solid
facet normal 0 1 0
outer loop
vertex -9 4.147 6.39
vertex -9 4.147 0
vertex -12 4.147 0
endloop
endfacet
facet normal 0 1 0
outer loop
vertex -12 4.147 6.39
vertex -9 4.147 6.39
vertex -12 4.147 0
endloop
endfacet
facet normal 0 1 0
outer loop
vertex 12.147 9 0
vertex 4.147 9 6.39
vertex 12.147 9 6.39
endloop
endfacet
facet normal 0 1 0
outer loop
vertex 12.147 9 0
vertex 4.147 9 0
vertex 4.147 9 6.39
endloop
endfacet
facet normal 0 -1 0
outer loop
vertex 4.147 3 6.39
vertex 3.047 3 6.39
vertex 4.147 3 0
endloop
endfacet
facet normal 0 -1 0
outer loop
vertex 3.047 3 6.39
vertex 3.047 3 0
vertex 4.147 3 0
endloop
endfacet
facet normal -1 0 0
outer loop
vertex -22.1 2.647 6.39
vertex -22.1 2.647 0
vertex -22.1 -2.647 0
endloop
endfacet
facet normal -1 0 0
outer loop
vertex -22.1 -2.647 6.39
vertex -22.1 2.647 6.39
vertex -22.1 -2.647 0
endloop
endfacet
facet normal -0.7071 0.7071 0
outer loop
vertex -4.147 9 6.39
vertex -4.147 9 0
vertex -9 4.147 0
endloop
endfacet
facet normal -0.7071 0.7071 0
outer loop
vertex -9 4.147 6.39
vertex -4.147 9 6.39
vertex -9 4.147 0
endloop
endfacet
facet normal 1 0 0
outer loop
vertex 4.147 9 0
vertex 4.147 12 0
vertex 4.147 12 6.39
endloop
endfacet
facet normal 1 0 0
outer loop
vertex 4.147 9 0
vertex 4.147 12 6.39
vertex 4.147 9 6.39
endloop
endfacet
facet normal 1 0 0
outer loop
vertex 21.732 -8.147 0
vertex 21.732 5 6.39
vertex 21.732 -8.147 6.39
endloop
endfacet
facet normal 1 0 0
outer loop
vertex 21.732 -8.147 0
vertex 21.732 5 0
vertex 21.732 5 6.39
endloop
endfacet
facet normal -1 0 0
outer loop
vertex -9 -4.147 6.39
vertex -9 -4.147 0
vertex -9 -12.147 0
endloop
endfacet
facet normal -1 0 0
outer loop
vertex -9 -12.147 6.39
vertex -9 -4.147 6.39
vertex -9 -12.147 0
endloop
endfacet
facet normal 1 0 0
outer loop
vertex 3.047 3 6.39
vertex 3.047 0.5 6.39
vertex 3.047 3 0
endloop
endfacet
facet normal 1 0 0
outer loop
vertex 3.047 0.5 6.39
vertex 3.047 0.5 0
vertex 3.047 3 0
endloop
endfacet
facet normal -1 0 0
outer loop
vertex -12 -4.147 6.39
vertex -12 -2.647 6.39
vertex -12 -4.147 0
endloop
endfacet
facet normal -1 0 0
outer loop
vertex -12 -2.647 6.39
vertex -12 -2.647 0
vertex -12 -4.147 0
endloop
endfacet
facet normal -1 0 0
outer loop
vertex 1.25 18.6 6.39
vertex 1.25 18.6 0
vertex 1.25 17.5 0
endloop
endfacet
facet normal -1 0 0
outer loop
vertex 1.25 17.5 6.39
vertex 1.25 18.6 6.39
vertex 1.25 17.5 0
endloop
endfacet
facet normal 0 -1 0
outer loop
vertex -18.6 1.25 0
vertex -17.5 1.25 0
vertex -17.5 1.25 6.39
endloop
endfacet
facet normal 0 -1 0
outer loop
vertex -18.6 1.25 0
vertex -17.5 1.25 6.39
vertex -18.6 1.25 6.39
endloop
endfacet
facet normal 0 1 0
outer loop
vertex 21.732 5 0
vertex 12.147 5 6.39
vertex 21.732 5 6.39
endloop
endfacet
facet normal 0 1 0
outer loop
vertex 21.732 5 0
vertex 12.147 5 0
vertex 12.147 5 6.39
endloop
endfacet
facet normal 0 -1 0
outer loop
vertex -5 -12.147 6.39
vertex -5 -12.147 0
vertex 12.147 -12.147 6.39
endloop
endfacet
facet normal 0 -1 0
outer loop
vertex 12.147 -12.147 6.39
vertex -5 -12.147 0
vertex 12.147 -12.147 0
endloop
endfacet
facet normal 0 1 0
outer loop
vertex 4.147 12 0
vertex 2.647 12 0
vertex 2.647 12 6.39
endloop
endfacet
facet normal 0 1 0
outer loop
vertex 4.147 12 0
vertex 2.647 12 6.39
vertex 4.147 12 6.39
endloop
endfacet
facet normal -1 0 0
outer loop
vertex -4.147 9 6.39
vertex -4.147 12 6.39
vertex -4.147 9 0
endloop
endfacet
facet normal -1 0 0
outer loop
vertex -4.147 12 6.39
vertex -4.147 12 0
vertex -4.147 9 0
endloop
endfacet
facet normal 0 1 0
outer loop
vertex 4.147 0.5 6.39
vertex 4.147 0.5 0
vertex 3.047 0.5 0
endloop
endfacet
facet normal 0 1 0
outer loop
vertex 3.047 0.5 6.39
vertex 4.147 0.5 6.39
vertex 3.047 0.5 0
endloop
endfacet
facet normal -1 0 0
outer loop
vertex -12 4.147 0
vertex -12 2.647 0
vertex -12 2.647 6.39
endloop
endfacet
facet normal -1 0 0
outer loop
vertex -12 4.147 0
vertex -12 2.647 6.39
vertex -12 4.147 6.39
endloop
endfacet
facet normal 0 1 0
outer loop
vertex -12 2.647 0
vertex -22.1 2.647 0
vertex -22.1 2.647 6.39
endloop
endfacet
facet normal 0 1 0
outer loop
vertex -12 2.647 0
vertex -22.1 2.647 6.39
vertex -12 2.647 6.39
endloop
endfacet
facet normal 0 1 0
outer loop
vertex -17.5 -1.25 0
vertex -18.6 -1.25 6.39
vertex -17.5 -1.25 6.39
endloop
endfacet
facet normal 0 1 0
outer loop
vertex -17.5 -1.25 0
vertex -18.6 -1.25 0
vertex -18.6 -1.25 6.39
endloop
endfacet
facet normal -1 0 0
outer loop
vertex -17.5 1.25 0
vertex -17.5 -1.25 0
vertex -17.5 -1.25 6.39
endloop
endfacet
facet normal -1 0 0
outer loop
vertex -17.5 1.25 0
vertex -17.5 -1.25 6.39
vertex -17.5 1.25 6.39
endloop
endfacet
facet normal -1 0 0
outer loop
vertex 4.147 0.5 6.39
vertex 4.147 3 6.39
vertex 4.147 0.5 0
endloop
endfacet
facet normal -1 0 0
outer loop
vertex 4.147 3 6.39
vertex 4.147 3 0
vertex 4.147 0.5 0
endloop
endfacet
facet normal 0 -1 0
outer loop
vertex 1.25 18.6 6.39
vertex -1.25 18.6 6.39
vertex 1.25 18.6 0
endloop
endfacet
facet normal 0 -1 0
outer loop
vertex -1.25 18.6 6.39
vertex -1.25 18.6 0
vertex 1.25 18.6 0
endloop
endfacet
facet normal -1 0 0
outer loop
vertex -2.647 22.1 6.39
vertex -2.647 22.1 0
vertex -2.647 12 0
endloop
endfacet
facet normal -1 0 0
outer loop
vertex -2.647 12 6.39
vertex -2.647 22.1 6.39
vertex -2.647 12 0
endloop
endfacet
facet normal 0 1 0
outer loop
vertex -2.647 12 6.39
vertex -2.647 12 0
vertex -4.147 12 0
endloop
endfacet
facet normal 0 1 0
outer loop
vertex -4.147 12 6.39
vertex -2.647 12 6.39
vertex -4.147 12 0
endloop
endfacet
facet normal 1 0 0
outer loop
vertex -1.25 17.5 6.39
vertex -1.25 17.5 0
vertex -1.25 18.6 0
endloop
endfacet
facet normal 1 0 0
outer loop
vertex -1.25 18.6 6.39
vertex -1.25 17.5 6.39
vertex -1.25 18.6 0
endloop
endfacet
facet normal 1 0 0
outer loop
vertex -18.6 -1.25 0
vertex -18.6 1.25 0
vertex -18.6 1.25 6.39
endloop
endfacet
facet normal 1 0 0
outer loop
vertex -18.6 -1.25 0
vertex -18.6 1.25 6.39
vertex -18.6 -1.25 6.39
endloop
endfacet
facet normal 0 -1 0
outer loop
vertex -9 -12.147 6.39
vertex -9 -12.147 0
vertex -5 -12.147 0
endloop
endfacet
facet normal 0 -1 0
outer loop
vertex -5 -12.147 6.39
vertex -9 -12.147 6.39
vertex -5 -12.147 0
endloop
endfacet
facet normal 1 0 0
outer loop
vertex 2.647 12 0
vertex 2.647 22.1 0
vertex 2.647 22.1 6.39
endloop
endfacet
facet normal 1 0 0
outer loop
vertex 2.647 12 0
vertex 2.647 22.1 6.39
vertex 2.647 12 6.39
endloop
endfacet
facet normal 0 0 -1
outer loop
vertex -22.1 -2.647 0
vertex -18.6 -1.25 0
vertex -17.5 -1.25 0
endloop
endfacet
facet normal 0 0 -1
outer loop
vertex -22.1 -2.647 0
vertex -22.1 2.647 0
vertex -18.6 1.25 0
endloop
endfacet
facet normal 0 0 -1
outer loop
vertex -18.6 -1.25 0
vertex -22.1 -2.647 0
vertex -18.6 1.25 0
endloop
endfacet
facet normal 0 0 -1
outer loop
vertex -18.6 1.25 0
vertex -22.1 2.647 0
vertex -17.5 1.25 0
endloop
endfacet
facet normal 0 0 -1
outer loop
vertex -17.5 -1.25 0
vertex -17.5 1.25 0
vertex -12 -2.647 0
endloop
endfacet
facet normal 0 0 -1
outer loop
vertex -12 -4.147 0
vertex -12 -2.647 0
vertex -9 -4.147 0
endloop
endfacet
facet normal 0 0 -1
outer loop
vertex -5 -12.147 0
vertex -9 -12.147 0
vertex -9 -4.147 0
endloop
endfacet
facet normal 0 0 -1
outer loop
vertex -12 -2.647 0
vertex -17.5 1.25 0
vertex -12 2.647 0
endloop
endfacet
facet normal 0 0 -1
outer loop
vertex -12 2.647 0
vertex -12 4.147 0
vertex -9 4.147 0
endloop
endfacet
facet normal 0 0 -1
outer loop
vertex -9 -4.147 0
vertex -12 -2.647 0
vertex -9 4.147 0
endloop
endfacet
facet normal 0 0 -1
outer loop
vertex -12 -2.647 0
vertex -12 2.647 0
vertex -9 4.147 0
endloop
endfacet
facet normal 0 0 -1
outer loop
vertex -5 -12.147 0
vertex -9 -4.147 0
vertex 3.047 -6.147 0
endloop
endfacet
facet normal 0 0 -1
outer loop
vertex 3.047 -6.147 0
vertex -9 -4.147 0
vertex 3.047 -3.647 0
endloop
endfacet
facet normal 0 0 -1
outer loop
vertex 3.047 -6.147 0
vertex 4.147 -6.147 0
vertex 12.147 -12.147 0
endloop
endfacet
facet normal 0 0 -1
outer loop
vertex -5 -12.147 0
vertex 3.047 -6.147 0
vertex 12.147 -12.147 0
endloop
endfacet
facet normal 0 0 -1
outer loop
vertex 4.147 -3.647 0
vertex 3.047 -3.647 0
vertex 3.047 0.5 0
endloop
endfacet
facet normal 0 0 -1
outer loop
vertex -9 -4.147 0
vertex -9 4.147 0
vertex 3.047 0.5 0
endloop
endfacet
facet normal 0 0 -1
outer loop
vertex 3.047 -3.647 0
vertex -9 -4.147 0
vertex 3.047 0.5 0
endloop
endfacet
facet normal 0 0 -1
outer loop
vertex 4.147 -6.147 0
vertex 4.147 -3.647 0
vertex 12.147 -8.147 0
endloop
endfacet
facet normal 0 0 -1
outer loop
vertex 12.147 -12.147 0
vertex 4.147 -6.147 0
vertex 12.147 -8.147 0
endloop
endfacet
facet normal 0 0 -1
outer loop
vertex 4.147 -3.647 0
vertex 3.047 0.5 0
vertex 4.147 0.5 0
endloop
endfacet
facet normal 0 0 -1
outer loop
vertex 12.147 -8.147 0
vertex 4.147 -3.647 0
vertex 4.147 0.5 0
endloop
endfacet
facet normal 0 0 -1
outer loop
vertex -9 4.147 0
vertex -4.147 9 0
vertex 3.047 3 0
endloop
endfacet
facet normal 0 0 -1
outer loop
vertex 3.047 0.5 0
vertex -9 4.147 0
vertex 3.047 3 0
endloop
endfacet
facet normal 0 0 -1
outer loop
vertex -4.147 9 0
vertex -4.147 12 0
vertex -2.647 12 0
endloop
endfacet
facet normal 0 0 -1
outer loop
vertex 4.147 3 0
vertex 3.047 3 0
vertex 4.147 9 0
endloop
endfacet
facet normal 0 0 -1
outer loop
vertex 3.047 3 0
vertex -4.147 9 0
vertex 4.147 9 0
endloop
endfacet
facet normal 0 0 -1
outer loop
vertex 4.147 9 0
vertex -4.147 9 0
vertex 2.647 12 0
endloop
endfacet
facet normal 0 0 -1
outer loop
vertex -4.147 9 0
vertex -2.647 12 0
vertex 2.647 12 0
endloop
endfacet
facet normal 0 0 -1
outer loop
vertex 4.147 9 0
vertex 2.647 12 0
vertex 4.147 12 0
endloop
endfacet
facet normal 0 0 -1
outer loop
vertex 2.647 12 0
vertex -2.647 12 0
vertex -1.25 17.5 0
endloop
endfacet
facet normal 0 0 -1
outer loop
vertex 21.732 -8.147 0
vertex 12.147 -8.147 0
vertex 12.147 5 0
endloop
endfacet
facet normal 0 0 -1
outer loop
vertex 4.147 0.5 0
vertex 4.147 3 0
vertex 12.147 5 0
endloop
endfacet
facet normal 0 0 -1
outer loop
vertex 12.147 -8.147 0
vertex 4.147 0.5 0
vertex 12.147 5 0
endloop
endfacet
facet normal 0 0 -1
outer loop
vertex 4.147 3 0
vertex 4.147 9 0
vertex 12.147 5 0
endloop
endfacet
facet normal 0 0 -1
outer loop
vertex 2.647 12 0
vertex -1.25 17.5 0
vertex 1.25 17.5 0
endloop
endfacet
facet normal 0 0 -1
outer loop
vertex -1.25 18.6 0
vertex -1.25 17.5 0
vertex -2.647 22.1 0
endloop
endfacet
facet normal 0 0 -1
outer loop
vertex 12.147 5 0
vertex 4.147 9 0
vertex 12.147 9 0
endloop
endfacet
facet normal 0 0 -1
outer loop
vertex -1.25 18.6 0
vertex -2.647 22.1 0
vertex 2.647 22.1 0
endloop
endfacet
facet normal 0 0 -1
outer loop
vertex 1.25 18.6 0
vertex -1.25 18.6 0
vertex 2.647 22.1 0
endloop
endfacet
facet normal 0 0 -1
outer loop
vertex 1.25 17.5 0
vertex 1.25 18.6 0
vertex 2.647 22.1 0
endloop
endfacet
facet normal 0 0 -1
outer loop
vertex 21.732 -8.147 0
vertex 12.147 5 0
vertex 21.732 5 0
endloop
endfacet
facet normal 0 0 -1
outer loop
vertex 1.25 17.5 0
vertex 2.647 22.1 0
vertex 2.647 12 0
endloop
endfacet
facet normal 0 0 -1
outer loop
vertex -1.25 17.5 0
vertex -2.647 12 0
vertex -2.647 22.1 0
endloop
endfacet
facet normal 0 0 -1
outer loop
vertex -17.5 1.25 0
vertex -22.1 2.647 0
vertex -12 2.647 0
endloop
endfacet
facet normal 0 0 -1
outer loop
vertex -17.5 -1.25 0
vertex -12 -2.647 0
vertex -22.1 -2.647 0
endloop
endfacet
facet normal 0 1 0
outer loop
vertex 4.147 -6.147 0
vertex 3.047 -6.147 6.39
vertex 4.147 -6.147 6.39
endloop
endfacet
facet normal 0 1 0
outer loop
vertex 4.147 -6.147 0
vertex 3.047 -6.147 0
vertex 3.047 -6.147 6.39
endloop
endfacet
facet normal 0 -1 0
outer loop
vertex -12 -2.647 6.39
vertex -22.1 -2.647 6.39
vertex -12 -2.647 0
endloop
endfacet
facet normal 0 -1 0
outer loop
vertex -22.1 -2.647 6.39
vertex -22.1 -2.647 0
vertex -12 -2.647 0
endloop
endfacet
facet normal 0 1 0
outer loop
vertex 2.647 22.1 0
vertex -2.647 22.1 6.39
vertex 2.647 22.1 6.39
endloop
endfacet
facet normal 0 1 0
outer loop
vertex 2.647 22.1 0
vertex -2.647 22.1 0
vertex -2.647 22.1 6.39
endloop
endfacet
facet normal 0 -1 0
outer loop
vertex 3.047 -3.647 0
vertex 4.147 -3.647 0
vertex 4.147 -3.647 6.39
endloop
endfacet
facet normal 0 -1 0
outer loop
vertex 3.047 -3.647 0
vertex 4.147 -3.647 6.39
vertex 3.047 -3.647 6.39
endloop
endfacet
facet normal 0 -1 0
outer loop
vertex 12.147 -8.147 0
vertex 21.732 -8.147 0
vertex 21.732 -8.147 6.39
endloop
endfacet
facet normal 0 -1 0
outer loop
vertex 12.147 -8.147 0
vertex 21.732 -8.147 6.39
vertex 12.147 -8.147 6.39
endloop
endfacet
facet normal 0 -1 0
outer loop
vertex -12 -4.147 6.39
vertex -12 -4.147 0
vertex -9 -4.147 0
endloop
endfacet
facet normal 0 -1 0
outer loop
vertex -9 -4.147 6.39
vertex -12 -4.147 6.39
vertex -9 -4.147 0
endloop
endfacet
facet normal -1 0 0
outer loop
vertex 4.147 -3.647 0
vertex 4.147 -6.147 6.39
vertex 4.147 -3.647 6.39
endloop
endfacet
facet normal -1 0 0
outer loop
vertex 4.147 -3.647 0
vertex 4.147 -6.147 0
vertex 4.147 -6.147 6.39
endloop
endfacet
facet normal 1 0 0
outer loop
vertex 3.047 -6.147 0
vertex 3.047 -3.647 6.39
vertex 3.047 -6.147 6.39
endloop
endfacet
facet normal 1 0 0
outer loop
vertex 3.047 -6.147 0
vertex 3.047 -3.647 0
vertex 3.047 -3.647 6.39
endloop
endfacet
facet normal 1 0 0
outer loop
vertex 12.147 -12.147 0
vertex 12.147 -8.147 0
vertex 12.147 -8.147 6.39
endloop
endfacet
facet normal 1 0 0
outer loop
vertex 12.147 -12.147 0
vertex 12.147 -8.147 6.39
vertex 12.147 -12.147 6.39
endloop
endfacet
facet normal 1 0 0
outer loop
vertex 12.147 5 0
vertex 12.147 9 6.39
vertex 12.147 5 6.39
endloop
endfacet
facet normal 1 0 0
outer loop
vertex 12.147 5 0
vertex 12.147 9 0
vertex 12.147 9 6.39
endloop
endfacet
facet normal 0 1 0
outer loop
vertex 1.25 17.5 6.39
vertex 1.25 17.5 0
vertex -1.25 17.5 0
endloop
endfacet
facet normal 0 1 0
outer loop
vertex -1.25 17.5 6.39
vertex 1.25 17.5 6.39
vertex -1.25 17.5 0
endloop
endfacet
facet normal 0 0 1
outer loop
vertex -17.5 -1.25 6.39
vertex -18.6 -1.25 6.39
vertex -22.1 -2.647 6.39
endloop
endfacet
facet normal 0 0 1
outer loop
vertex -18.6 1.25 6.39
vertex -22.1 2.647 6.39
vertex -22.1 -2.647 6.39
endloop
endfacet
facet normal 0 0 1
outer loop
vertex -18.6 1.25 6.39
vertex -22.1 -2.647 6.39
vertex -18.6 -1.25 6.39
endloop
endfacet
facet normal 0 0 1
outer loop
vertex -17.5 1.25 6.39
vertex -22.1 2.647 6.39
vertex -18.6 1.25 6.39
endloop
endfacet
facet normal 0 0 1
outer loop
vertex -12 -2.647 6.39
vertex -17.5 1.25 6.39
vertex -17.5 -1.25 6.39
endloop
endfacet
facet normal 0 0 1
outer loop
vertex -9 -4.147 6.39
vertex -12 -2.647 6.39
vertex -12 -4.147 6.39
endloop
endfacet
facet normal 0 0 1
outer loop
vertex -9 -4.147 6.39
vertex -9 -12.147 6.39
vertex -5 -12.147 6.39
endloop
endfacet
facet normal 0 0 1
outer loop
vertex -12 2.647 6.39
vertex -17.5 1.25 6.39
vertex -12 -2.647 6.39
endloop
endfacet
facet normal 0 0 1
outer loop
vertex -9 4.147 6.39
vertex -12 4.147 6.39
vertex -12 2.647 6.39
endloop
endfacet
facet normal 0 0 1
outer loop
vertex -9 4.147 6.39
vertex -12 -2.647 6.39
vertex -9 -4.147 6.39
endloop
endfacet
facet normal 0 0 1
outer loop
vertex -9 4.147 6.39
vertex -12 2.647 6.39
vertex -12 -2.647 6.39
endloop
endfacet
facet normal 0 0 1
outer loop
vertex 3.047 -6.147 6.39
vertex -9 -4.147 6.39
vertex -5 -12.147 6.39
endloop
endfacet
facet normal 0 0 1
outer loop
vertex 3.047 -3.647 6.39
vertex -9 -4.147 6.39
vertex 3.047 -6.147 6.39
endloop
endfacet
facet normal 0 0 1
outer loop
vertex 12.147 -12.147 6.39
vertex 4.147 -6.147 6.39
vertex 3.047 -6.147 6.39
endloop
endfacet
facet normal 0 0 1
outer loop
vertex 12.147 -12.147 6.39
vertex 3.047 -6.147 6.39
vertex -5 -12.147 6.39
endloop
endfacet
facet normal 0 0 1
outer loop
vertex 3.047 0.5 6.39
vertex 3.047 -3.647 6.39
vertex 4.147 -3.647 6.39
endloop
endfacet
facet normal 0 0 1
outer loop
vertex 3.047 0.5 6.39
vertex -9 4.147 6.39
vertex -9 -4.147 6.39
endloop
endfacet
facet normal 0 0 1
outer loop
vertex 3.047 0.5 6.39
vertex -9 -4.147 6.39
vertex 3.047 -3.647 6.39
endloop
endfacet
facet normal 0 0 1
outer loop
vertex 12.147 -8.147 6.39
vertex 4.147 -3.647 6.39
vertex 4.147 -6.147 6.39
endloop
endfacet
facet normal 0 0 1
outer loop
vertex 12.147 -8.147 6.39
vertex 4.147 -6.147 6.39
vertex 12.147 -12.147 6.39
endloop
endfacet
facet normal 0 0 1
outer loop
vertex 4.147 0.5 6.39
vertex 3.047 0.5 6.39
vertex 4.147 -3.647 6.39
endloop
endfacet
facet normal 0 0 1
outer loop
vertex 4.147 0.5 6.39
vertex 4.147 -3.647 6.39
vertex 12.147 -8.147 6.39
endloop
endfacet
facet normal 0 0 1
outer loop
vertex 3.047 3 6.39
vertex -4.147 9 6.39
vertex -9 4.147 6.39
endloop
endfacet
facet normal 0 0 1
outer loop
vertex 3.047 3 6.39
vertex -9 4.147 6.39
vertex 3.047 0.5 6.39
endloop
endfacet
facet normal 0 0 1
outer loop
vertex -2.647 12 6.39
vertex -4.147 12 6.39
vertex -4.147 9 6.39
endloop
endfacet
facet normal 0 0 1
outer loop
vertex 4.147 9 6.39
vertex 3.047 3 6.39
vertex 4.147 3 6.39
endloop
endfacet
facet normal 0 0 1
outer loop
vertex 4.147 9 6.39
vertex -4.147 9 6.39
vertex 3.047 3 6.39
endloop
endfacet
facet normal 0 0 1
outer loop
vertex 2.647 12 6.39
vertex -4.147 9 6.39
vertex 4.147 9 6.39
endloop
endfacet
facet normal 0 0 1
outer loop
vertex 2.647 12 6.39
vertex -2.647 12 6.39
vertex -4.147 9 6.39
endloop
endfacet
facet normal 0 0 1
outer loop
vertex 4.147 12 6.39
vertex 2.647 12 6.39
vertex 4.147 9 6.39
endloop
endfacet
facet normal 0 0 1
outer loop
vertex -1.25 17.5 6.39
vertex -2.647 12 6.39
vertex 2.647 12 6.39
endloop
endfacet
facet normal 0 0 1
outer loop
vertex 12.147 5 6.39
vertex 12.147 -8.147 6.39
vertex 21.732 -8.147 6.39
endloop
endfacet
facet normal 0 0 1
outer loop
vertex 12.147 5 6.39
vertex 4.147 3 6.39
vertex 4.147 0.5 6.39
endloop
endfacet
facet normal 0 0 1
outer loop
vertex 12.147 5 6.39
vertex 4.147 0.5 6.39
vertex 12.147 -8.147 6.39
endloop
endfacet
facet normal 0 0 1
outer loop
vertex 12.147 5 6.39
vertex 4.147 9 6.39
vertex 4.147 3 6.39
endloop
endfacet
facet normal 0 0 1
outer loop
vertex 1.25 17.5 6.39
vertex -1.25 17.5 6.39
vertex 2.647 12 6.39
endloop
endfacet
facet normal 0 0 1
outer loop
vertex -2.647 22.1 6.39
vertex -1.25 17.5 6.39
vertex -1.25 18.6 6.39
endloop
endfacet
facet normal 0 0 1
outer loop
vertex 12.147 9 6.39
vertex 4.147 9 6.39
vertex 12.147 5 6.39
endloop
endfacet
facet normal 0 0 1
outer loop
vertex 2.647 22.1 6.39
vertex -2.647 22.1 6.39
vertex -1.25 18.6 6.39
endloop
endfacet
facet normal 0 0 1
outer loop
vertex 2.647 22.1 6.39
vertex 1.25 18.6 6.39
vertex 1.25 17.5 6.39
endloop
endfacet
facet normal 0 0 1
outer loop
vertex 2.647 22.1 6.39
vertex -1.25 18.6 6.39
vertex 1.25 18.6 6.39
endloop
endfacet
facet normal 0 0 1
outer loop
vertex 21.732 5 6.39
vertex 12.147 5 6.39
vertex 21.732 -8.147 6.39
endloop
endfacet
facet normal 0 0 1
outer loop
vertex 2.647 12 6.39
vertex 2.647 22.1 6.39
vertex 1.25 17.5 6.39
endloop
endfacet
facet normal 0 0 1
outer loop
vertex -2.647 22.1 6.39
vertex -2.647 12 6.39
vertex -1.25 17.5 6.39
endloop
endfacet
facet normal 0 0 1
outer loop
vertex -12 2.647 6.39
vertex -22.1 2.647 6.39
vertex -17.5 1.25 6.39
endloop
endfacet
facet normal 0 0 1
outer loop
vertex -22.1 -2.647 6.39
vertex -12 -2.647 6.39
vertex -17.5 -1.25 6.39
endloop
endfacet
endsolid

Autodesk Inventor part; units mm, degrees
ref_plane "YZ Plane" through (0, 0, 0) normal (1, 0, 0) x (0, 1, 0)
ref_plane "XZ Plane" through (0, 0, 0) normal (0, 1, 0) x (-1, 0, 0)
ref_plane "XY Plane" through (0, 0, 0) normal (0, 0, 1) x (1, 0, 0)
sketch "Sketch1" plane through (0, 0, 0) normal (0, 0, 1) x (1, 0, 0)
  line L0 (-2.6473, 22.1) -> (2.6473, 22.1)
  line L1 (2.6473, 22.1) -> (2.6473, 12)
  line L2 (2.6473, 12) -> (4.1473, 12)
  line L3 (4.1473, 12) -> (4.1473, 9)
  line L4 (4.1473, 9) -> (12.1473, 9)
  line L5 (0, 22.1) -> (0, 0) construction
  line L6 (-2.6473, 22.1) -> (-2.6473, 12)
  line L7 (-2.6473, 12) -> (-4.1473, 12)
  line L8 (-1.25, 18.6) -> (1.25, 18.6)
  line L9 (1.25, 18.6) -> (1.25, 17.5)
  line L10 (1.25, 17.5) -> (-1.25, 17.5)
  line L11 (-1.25, 17.5) -> (-1.25, 18.6)
  line L12 (-5, -12.1473) -> (12.1473, -12.1473)
  line L13 (12.1473, 9) -> (12.1473, 5)
  line L14 (12.1473, 5) -> (21.7323, 5)
  line L15 (21.7323, -8.1473) -> (12.1473, -8.1473)
  line L16 (12.1473, -8.1473) -> (12.1473, -12.1473)
  line L17 (3.0473, 3) -> (4.1473, 3)
  line L18 (4.1473, 3) -> (4.1473, 0.5)
  line L19 (4.1473, 0.5) -> (3.0473, 0.5)
  line L20 (3.0473, 0.5) -> (3.0473, 3)
  line L21 (-4.1473, 12) -> (-19.8527, 12) construction
  line L22 (0, 0) -> (-12, 12) construction
  line L23 (-22.1, 2.6473) -> (-22.1, -2.6473)
  line L24 (-22.1, -2.6473) -> (-12, -2.6473)
  line L25 (-12, -2.6473) -> (-12, -4.1473)
  line L26 (-12, -4.1473) -> (-9, -4.1473)
  line L27 (-9, -4.1473) -> (-9, -12.1473)
  line L28 (-22.1, 2.6473) -> (-12, 2.6473)
  line L29 (-12, 2.6473) -> (-12, 4.1473)
  line L30 (-18.6, 1.25) -> (-18.6, -1.25)
  line L31 (-18.6, -1.25) -> (-17.5, -1.25)
  line L32 (-17.5, -1.25) -> (-17.5, 1.25)
  line L33 (-17.5, 1.25) -> (-18.6, 1.25)
  line L34 (-9, -12.1473) -> (-5, -12.1473)
  line L35 (-12, 12) -> (-12, -12.1473) construction
  line L36 (-4.1473, 12) -> (-4.1473, 9)
  line L37 (-9, 4.1473) -> (-12, 4.1473)
  line L38 (-4.1473, 9) -> (-9, 4.1473)
  line L39 (21.7323, 5) -> (21.7323, -8.1473)
  line L40 (21.7323, -1.5737) -> (3.3412, -1.5737) construction
  line L41 (3.0473, -6.1473) -> (4.1473, -6.1473)
  line L42 (4.1473, -6.1473) -> (4.1473, -3.6473)
  line L43 (4.1473, -3.6473) -> (3.0473, -3.6473)
  line L44 (3.0473, -3.6473) -> (3.0473, -6.1473)
  line L45 (-22.1, 0) -> (21.7323, 0) construction
  point P0 (0, 17.5)
  point P1 (3.0473, 1.75)
  point P2 (-17.5, 0)
  point P3 (4.1473, 1.75)
  point P4 (4.1473, 10.5)
  dimension "d4" = 1.5
  dimension "d5" = 3
  dimension "d26" = 10.1
  dimension "d27" = 5.2946
  dimension "d31" = 2.5
  dimension "d32" = 1.1
  dimension "d35" = 5.5
  dimension "d37" = 9.585
  dimension "d41" = 1.1
  dimension "d42" = 2.5
  dimension "d45" = 2
  dimension "d61" = 45
  dimension "d70" = 8
  dimension "d72" = 12
  dimension "BearingShaftOffset" = 1.5737
  dimension "BearingHolderHeight" = 23.6737
  dimension "LatchHeight" = 13.1473
  dimension "d95" = 24.1473
extrude "Extrusion2" add sketch "Sketch1" along normal blind 6.39
equation "\"BearingDiameter\" = 24"
equation "\"WoodThickness\" = 6.39"
equation "\"BearingWidth\" = 7"
equation "\"BearingShaftDiameter\" = 8"
equation "\"ZipTieWidth\" = 2.5"
equation "\"ZipTieThickness\" = 1.1"
equation "\"ZipTieClearance\" = 1"
equation "\"ZipTieDistance\" = 10"
equation "\"BearingSiliconeWidth\" = 13.2"
properties part number "BearingStand" material "MDF Medium Density Fiberboard"
